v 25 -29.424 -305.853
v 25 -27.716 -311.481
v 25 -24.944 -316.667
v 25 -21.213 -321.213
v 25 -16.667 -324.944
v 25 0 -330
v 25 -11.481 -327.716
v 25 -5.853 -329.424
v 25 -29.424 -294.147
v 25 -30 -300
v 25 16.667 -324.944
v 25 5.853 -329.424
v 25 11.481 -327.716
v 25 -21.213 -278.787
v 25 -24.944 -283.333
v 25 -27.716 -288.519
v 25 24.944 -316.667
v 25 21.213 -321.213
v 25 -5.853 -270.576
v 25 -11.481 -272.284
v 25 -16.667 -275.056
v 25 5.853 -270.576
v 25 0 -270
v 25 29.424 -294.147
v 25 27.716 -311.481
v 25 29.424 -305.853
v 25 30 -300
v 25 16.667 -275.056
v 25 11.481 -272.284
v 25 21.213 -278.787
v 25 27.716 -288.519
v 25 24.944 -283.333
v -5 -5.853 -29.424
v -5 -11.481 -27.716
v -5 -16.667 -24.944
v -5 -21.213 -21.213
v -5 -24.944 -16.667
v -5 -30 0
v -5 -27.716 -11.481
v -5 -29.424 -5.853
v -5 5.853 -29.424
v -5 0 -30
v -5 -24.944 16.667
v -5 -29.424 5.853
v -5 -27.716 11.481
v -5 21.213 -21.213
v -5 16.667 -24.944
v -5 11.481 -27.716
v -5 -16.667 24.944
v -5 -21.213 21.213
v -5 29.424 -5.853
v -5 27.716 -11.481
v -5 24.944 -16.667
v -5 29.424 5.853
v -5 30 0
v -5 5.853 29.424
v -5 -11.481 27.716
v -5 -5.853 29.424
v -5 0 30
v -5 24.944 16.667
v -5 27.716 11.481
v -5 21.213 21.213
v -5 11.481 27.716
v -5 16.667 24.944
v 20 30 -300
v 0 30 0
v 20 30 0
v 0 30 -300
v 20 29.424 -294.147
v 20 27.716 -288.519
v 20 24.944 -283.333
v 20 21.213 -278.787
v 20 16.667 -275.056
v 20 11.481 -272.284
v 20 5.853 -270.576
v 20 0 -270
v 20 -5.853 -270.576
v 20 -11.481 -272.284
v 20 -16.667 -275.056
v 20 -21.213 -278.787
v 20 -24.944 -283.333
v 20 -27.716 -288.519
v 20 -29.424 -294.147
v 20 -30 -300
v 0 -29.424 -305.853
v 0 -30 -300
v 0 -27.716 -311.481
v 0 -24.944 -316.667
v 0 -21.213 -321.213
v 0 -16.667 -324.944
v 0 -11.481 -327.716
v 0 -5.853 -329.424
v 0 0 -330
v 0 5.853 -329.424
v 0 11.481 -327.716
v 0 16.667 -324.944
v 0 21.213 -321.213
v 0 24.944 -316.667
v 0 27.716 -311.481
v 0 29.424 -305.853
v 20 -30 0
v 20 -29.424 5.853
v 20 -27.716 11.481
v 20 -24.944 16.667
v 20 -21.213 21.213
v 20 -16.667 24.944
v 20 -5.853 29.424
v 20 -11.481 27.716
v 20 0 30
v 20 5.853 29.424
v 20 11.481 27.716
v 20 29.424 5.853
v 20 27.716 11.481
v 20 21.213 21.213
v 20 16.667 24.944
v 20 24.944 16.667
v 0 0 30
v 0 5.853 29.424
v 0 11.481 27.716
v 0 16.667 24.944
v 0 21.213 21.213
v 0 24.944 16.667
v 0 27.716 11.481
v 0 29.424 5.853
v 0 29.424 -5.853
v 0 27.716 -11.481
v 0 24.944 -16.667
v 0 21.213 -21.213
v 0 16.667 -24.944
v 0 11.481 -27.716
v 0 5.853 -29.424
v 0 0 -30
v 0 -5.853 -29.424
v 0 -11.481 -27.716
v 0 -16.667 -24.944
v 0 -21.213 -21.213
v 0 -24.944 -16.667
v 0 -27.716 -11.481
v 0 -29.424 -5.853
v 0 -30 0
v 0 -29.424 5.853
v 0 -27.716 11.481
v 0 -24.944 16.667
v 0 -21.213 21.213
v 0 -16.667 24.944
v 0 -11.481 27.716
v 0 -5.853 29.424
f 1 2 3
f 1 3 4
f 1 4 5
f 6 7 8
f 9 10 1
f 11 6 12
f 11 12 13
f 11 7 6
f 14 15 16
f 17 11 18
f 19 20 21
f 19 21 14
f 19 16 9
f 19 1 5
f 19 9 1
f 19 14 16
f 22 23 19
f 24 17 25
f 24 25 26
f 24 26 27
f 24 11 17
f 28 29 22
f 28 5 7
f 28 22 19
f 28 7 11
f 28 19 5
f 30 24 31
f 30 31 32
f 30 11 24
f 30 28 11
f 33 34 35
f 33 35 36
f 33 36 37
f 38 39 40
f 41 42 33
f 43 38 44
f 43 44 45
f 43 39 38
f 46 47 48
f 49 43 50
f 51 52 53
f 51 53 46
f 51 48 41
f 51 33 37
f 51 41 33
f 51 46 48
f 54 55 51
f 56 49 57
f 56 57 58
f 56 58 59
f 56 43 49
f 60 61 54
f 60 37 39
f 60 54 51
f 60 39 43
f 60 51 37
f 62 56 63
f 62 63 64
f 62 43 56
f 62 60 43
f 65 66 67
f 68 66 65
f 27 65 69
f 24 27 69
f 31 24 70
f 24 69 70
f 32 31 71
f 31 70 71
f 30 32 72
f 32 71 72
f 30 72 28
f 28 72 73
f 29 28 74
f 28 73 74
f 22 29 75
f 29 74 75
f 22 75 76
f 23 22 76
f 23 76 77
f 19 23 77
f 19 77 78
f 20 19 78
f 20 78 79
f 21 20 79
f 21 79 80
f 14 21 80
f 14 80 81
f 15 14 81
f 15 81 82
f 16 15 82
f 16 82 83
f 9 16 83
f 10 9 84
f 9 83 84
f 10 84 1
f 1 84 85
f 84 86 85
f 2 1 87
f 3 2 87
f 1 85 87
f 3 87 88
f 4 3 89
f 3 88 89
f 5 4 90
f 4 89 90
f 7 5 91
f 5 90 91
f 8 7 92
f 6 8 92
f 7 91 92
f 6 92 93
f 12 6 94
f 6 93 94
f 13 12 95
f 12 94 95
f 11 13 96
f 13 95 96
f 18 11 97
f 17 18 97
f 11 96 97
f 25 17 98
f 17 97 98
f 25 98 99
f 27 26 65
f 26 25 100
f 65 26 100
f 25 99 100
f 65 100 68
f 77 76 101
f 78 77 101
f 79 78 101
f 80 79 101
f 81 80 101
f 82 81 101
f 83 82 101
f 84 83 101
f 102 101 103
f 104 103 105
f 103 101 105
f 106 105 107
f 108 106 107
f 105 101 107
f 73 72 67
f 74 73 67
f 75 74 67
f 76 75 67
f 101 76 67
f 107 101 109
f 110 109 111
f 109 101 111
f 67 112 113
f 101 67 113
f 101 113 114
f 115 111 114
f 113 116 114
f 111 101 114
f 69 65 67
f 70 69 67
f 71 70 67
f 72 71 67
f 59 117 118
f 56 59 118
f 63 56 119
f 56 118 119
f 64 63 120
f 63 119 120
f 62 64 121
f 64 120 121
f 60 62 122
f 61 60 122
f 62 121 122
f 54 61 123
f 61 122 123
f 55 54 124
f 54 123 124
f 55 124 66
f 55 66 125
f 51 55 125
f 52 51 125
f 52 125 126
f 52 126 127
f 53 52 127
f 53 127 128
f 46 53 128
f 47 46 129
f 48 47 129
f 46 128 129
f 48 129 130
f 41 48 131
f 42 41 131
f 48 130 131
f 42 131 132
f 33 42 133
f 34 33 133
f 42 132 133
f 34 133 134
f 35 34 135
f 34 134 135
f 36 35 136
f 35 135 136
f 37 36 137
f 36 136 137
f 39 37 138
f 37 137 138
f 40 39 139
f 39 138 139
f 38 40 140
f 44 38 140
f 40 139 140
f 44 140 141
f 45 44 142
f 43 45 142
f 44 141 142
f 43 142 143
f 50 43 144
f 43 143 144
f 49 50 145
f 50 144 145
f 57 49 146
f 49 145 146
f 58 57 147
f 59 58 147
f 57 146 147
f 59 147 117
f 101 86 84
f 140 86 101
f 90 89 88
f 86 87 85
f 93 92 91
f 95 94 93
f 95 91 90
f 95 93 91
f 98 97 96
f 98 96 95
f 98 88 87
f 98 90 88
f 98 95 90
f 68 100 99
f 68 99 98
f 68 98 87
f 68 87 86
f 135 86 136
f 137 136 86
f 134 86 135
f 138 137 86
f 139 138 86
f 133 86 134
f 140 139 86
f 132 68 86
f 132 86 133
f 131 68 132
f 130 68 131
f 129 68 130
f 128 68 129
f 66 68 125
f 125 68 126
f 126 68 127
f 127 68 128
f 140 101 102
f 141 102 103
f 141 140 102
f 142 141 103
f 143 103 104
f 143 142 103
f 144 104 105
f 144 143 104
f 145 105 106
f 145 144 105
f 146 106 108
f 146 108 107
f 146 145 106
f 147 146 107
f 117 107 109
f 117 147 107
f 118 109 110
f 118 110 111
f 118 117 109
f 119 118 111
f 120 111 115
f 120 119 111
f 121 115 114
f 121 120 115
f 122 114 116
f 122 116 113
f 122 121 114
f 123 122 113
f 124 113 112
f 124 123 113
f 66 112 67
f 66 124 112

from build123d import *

# Parameters (mm, degrees)
EXTRUDE_1_DEPTH = 20
SKETCH_2_R      = 30
EXTRUDE_2_DEPTH = 5
SKETCH_3_R      = 30
EXTRUDE_3_DEPTH = 5


with BuildPart() as part:
    # 草图1 → 凸台-拉伸1 (new body)
    with BuildSketch(Plane(origin=(0, 0, 0), x_dir=(0, 0, -1), z_dir=(1, 0, 0))):
        with BuildLine():
            Line((0, 30), (300, 30))
            ThreePointArc((300, 30), (330, 0), (300, -30))
            Line((300, -30), (0, -30))
            ThreePointArc((0, -30), (-30, 0), (0, 30))
        make_face()
    extrude(amount=EXTRUDE_1_DEPTH)

    # 草图2 → 凸台-拉伸2 (add)
    with BuildSketch(Plane(origin=(20, 0, 0), x_dir=(0, 0, -1), z_dir=(1, 0, 0))):
        with Locations(Location((300, 0, 0), (0, 0, 90))):
            Circle(SKETCH_2_R)
    extrude(amount=EXTRUDE_2_DEPTH)

    # 草图3 → 凸台-拉伸3 (add)
    with BuildSketch(Plane.ZY):
        Circle(SKETCH_3_R)
    extrude(amount=EXTRUDE_3_DEPTH)


solid = part.part
